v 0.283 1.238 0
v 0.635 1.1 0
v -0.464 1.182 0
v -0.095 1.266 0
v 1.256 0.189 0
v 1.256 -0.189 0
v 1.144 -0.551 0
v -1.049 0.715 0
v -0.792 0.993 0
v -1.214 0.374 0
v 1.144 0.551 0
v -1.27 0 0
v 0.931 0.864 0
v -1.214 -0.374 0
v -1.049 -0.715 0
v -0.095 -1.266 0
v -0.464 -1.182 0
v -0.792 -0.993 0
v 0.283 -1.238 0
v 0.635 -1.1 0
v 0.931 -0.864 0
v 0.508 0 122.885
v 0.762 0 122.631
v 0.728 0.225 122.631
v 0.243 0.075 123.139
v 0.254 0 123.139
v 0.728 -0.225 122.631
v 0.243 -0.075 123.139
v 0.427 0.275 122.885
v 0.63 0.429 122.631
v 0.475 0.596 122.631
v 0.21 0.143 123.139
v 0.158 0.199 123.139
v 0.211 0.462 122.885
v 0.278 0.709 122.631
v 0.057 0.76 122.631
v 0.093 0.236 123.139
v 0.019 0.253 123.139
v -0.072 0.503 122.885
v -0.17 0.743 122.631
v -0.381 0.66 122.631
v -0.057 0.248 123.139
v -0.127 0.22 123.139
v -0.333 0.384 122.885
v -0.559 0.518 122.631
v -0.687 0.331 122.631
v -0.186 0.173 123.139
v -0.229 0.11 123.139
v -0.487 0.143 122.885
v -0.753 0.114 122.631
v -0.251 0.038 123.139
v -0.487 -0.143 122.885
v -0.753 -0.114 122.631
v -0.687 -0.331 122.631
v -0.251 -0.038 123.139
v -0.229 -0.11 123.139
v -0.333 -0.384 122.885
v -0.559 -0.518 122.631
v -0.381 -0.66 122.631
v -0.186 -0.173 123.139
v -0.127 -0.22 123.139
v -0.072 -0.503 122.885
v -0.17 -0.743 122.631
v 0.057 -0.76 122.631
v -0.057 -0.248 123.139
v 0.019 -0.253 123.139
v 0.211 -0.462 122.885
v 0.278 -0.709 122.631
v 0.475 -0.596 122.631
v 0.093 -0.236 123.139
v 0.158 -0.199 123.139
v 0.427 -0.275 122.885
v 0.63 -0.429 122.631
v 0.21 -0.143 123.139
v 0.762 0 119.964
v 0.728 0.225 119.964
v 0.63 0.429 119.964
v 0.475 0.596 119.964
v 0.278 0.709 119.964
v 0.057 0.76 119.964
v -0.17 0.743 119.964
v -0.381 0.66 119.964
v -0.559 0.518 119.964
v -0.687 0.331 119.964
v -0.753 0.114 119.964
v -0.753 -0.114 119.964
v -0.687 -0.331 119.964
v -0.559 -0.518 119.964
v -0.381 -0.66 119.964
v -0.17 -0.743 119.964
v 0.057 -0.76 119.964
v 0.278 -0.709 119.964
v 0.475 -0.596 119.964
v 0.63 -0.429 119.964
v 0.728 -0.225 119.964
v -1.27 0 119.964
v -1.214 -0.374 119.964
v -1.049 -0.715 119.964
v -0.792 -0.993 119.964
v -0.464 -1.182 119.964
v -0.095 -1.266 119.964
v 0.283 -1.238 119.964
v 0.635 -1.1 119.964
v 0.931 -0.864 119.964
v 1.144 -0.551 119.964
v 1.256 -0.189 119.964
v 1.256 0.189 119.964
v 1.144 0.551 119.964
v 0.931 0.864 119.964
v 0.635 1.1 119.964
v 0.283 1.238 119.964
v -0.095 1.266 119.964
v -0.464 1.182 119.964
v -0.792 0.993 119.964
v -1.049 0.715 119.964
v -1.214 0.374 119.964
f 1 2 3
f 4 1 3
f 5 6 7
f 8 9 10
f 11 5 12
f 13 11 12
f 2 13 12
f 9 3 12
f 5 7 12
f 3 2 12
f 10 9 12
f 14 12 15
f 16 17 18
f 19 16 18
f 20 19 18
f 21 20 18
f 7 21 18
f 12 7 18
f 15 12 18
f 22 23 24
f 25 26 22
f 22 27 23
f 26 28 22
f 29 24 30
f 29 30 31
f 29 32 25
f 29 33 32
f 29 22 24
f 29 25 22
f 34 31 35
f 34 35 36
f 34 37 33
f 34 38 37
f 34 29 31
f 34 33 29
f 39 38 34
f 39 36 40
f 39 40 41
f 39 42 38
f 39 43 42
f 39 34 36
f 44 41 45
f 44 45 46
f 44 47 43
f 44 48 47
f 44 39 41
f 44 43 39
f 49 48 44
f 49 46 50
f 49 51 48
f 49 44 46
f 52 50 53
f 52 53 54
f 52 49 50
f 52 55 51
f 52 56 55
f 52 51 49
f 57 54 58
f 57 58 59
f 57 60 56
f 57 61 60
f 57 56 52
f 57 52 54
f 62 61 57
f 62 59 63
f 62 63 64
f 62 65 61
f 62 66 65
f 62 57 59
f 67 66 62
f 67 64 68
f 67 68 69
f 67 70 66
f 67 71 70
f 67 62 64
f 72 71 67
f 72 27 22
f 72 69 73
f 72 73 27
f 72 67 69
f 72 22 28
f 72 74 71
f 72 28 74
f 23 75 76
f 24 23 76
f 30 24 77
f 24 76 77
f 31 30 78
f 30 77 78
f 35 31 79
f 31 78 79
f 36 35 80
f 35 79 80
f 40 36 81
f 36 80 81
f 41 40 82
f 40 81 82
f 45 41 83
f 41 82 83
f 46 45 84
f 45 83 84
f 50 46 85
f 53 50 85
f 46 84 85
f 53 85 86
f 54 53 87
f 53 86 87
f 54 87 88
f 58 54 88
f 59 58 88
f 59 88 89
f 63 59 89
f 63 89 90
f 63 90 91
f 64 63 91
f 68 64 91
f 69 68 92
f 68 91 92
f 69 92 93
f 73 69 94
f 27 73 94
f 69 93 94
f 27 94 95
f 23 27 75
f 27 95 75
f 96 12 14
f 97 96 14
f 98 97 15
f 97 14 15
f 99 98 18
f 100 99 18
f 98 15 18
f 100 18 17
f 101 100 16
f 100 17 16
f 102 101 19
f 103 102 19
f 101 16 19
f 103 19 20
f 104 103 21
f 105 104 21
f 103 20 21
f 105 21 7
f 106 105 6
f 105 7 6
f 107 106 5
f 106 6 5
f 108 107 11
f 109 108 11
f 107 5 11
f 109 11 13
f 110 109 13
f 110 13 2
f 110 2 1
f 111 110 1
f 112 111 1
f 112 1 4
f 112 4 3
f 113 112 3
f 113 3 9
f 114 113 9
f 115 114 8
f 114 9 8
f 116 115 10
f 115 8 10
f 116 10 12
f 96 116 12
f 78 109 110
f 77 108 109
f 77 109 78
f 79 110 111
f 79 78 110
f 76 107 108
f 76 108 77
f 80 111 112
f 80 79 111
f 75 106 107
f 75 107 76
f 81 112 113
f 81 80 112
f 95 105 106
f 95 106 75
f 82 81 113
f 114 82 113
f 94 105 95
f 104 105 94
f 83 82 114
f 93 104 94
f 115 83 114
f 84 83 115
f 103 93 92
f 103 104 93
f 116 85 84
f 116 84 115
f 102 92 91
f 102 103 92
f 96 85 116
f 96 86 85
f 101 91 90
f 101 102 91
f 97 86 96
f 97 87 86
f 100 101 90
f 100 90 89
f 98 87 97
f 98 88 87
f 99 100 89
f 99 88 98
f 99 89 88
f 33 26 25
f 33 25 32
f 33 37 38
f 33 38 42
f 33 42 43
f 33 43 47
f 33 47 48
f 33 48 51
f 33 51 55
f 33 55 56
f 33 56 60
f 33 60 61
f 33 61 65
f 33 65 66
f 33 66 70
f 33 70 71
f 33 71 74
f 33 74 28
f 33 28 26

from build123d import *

# Parameters (mm, degrees)
SKETCH1_R           = 1.27
BOSS_EXTRUDE1_DEPTH = 119.9642
SKETCH3_R           = 0.762
BOSS_EXTRUDE2_DEPTH = 3.175
CHAMFER1_SIZE       = 0.508


with BuildPart() as part:
    # Sketch1 → Boss-Extrude1 (new body)
    with BuildSketch(Plane.XY):
        Circle(SKETCH1_R)
    extrude(amount=BOSS_EXTRUDE1_DEPTH)

    # Sketch3 → Boss-Extrude2 (add)
    with BuildSketch(Plane.XY.offset(119.9642)):
        Circle(SKETCH3_R)
    extrude(amount=BOSS_EXTRUDE2_DEPTH)

    # Chamfer1
    chamfer1_edges = [part.edges().sort_by_distance(p)[0] for p in [
        (-0.762, 0, 123.1392),
    ]]
    chamfer(chamfer1_edges, length=CHAMFER1_SIZE)


solid = part.part
